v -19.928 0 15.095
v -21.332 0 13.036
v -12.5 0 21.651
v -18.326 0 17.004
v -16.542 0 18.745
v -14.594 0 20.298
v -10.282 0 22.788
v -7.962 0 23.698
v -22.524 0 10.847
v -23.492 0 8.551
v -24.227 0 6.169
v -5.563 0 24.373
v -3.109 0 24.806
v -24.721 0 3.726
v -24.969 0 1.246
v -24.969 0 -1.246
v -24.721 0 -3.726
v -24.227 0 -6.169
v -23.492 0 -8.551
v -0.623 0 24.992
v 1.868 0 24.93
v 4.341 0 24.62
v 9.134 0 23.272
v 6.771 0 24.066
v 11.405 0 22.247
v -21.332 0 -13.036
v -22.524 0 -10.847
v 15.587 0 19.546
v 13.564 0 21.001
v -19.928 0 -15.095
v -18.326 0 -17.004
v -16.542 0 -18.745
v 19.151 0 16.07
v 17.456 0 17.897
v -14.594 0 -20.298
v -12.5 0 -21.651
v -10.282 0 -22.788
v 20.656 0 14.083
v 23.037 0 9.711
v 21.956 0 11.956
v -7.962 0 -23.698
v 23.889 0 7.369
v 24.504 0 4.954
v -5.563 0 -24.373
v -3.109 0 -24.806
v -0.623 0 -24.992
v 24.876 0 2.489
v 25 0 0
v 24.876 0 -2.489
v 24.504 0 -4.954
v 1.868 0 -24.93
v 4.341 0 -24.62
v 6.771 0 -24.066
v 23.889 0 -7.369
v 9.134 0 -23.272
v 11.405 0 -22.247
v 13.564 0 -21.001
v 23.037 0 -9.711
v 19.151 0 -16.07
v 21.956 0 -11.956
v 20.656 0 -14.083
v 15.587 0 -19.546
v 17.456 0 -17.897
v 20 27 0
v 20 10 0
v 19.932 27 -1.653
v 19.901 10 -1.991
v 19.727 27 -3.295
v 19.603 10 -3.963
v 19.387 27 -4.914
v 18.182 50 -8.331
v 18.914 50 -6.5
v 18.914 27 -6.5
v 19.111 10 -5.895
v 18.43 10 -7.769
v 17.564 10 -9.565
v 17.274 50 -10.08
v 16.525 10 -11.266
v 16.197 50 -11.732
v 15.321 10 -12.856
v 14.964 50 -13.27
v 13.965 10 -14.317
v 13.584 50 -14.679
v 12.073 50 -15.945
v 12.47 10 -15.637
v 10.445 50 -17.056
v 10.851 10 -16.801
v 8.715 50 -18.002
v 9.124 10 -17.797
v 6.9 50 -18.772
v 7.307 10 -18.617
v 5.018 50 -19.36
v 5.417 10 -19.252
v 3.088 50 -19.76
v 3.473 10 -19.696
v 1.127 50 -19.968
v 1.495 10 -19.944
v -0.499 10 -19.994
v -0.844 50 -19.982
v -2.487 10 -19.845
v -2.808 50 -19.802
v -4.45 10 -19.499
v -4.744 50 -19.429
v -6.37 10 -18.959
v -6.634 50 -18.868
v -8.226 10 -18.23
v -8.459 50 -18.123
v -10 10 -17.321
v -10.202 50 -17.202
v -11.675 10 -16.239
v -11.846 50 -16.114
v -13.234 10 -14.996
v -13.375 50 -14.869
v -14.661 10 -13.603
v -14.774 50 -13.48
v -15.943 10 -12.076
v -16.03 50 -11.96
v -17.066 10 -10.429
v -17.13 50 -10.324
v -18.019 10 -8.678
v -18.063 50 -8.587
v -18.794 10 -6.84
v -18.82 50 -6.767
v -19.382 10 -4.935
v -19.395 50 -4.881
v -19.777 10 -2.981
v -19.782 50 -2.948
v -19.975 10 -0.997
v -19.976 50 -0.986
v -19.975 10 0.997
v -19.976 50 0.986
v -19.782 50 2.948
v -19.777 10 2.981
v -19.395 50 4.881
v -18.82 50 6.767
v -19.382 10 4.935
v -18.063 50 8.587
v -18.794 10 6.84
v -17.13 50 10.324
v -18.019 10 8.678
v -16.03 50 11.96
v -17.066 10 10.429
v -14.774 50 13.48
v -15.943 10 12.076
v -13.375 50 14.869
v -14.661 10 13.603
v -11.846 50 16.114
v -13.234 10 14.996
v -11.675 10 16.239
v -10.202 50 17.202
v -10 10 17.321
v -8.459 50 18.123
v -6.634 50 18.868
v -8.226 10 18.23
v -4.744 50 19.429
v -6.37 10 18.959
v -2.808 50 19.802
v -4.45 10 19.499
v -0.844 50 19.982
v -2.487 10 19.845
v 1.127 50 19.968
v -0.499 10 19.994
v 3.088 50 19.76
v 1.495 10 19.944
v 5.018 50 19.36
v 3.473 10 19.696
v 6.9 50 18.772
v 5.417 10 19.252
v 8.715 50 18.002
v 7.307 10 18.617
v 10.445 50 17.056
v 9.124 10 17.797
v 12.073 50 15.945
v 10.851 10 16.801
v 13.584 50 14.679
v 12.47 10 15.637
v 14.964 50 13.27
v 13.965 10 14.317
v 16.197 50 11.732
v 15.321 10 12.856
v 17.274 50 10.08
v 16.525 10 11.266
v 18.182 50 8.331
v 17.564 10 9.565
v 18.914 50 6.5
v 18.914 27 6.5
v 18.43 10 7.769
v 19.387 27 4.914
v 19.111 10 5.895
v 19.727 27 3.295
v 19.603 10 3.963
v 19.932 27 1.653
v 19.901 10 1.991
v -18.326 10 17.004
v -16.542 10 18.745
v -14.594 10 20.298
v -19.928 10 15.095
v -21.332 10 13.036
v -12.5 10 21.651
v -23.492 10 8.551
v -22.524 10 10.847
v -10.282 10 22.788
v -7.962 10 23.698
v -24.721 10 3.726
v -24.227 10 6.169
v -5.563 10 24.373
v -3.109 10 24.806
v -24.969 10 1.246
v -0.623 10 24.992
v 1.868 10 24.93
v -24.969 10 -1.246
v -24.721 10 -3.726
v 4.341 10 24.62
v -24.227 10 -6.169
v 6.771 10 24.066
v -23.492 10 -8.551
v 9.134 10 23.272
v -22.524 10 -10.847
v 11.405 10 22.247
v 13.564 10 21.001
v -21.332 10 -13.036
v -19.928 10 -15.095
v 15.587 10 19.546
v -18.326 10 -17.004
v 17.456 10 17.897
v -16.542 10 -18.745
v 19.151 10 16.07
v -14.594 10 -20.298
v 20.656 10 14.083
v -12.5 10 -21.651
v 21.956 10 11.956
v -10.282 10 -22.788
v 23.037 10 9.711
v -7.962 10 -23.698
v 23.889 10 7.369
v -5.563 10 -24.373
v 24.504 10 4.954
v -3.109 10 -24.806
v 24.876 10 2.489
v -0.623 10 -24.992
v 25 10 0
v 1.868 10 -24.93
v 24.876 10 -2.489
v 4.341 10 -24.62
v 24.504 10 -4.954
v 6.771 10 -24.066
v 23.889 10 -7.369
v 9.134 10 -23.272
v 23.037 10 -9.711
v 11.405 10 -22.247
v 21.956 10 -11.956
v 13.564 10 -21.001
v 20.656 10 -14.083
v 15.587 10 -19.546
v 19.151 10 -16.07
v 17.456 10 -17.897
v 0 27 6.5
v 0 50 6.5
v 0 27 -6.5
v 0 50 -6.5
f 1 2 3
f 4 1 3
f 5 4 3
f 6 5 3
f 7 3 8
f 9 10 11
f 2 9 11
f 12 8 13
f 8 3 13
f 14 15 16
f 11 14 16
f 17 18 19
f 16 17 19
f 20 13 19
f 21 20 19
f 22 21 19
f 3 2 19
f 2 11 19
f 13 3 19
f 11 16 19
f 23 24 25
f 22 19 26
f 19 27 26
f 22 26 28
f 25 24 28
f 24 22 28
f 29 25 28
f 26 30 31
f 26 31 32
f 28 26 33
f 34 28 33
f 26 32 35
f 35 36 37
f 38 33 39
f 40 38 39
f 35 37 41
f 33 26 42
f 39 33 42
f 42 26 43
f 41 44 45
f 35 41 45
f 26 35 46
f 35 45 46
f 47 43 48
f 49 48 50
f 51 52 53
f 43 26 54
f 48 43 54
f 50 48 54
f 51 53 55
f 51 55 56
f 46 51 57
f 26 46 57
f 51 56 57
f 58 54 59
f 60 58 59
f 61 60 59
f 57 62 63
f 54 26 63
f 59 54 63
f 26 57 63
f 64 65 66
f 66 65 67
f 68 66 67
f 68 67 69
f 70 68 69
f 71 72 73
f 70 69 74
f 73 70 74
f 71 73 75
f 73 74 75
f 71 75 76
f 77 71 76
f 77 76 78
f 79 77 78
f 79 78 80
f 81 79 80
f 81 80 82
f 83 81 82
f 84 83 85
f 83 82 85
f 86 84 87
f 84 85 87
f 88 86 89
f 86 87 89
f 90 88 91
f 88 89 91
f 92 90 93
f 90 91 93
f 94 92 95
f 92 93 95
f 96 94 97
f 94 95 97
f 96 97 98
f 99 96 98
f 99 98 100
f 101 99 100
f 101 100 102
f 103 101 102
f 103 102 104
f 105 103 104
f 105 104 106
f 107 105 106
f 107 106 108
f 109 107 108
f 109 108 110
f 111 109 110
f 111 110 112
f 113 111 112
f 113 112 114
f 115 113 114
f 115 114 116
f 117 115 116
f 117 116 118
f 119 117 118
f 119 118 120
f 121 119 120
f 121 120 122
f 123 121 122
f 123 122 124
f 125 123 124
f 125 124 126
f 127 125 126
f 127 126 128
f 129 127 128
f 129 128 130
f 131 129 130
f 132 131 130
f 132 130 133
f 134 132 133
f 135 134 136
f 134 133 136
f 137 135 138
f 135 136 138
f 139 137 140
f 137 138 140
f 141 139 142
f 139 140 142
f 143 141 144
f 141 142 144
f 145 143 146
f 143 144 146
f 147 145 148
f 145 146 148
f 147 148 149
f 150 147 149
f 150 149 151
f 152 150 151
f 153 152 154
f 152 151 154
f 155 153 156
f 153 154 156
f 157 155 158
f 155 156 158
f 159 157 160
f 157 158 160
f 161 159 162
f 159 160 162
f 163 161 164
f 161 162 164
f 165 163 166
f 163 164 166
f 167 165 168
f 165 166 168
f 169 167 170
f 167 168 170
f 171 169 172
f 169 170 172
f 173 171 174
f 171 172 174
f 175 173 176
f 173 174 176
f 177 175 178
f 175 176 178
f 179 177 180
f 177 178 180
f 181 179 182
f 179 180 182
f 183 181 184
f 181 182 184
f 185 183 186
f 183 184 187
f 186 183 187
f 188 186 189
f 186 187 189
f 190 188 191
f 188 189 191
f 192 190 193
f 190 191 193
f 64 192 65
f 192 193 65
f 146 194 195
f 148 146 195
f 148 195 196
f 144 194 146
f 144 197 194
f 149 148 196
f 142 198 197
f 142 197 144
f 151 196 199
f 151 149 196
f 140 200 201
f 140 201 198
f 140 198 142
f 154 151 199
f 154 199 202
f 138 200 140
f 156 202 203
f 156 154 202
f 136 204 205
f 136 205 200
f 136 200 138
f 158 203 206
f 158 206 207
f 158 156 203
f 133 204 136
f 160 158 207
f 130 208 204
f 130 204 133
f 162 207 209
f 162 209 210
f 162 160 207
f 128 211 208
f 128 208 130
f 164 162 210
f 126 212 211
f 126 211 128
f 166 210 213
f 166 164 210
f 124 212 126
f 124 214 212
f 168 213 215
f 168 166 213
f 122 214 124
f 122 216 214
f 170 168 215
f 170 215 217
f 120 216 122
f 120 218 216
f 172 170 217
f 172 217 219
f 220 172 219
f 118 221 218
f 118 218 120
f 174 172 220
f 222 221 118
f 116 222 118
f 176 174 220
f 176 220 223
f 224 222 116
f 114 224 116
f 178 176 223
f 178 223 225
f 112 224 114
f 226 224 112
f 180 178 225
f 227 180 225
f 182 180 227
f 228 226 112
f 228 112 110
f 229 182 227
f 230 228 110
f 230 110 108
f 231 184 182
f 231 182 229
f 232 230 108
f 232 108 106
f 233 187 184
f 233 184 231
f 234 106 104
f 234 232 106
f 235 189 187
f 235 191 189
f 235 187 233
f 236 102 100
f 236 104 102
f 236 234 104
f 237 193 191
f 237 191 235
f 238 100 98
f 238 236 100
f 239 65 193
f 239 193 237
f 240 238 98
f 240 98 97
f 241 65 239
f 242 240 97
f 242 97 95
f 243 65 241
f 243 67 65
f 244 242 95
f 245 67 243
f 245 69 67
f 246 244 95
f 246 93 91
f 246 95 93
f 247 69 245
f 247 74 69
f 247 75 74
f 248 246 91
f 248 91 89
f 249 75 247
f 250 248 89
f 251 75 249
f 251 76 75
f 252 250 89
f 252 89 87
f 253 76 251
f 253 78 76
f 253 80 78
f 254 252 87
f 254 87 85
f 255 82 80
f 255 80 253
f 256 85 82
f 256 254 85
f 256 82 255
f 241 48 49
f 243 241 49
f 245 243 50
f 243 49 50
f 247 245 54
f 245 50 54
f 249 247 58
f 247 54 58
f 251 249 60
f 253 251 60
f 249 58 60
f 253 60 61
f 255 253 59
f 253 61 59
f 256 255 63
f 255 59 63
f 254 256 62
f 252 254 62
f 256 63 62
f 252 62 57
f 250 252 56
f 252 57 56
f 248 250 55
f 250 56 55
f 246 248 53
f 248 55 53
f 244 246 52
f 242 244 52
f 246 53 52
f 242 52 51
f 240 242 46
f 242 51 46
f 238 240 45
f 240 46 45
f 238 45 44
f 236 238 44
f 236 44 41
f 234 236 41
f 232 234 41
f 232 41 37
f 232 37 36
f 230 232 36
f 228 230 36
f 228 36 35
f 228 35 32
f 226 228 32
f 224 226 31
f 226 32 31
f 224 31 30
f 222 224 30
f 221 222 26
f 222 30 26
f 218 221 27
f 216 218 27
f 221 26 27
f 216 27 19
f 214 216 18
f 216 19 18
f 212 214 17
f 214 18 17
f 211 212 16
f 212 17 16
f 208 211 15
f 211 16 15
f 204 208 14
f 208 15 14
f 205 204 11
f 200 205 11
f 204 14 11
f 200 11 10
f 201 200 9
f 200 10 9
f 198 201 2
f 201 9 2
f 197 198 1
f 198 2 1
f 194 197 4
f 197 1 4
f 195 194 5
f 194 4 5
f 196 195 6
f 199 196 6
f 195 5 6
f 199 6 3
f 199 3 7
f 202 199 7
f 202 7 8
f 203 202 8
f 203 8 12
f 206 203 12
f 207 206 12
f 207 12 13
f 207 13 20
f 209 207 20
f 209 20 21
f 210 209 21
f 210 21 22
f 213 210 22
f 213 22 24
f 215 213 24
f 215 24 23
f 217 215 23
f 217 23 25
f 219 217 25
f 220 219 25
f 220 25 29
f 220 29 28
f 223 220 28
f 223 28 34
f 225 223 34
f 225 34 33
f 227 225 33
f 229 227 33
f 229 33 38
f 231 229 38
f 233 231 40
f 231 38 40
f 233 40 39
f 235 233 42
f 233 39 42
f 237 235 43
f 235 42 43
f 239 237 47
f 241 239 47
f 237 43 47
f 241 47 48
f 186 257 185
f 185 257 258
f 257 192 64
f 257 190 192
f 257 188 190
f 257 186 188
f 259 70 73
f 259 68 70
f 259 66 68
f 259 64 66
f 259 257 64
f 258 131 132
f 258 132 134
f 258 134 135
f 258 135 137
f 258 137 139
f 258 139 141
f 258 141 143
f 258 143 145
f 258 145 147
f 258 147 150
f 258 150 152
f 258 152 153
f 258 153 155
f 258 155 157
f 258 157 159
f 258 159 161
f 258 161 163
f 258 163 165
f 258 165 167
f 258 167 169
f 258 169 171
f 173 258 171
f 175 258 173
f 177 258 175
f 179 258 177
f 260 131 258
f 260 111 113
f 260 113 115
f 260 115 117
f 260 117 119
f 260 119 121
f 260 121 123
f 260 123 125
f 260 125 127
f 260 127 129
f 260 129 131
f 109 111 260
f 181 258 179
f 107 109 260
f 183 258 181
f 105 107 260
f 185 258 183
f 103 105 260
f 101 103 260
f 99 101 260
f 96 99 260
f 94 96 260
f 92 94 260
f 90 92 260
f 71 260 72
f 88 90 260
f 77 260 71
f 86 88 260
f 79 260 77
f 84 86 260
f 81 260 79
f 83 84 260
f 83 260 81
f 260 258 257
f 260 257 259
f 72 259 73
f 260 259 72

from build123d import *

# Parameters (mm, degrees)
CROQUIS1_R              = 25
SALIENTE_EXTRUIR1_DEPTH = 10
CROQUIS2_R              = 20
SALIENTE_EXTRUIR3_DEPTH = 40
CROQUIS4_W              = 13
CROQUIS4_H              = 23
CORTAR_EXTRUIR2_DEPTH   = 40


with BuildPart() as part:
    # Croquis1 → Saliente-Extruir1 (new body)
    with BuildSketch(Plane(origin=(0, 0, 0), x_dir=(1, 0, 0), z_dir=(0, 1, 0))):
        Circle(CROQUIS1_R)
    extrude(amount=SALIENTE_EXTRUIR1_DEPTH)

    # Croquis2 → Saliente-Extruir3 (add)
    with BuildSketch(Plane(origin=(0, 10, 0), x_dir=(1, 0, 0), z_dir=(0, 1, 0))):
        Circle(CROQUIS2_R)
    extrude(amount=SALIENTE_EXTRUIR3_DEPTH)

    # Croquis4 → Cortar-Extruir2 (cut)
    with BuildSketch(Plane(origin=(0, 0, 0), x_dir=(0, 0, -1), z_dir=(1, 0, 0))):
        with Locations((0, 38.5)):
            Rectangle(CROQUIS4_W, CROQUIS4_H)
    extrude(amount=CORTAR_EXTRUIR2_DEPTH, mode=Mode.SUBTRACT)


solid = part.part
